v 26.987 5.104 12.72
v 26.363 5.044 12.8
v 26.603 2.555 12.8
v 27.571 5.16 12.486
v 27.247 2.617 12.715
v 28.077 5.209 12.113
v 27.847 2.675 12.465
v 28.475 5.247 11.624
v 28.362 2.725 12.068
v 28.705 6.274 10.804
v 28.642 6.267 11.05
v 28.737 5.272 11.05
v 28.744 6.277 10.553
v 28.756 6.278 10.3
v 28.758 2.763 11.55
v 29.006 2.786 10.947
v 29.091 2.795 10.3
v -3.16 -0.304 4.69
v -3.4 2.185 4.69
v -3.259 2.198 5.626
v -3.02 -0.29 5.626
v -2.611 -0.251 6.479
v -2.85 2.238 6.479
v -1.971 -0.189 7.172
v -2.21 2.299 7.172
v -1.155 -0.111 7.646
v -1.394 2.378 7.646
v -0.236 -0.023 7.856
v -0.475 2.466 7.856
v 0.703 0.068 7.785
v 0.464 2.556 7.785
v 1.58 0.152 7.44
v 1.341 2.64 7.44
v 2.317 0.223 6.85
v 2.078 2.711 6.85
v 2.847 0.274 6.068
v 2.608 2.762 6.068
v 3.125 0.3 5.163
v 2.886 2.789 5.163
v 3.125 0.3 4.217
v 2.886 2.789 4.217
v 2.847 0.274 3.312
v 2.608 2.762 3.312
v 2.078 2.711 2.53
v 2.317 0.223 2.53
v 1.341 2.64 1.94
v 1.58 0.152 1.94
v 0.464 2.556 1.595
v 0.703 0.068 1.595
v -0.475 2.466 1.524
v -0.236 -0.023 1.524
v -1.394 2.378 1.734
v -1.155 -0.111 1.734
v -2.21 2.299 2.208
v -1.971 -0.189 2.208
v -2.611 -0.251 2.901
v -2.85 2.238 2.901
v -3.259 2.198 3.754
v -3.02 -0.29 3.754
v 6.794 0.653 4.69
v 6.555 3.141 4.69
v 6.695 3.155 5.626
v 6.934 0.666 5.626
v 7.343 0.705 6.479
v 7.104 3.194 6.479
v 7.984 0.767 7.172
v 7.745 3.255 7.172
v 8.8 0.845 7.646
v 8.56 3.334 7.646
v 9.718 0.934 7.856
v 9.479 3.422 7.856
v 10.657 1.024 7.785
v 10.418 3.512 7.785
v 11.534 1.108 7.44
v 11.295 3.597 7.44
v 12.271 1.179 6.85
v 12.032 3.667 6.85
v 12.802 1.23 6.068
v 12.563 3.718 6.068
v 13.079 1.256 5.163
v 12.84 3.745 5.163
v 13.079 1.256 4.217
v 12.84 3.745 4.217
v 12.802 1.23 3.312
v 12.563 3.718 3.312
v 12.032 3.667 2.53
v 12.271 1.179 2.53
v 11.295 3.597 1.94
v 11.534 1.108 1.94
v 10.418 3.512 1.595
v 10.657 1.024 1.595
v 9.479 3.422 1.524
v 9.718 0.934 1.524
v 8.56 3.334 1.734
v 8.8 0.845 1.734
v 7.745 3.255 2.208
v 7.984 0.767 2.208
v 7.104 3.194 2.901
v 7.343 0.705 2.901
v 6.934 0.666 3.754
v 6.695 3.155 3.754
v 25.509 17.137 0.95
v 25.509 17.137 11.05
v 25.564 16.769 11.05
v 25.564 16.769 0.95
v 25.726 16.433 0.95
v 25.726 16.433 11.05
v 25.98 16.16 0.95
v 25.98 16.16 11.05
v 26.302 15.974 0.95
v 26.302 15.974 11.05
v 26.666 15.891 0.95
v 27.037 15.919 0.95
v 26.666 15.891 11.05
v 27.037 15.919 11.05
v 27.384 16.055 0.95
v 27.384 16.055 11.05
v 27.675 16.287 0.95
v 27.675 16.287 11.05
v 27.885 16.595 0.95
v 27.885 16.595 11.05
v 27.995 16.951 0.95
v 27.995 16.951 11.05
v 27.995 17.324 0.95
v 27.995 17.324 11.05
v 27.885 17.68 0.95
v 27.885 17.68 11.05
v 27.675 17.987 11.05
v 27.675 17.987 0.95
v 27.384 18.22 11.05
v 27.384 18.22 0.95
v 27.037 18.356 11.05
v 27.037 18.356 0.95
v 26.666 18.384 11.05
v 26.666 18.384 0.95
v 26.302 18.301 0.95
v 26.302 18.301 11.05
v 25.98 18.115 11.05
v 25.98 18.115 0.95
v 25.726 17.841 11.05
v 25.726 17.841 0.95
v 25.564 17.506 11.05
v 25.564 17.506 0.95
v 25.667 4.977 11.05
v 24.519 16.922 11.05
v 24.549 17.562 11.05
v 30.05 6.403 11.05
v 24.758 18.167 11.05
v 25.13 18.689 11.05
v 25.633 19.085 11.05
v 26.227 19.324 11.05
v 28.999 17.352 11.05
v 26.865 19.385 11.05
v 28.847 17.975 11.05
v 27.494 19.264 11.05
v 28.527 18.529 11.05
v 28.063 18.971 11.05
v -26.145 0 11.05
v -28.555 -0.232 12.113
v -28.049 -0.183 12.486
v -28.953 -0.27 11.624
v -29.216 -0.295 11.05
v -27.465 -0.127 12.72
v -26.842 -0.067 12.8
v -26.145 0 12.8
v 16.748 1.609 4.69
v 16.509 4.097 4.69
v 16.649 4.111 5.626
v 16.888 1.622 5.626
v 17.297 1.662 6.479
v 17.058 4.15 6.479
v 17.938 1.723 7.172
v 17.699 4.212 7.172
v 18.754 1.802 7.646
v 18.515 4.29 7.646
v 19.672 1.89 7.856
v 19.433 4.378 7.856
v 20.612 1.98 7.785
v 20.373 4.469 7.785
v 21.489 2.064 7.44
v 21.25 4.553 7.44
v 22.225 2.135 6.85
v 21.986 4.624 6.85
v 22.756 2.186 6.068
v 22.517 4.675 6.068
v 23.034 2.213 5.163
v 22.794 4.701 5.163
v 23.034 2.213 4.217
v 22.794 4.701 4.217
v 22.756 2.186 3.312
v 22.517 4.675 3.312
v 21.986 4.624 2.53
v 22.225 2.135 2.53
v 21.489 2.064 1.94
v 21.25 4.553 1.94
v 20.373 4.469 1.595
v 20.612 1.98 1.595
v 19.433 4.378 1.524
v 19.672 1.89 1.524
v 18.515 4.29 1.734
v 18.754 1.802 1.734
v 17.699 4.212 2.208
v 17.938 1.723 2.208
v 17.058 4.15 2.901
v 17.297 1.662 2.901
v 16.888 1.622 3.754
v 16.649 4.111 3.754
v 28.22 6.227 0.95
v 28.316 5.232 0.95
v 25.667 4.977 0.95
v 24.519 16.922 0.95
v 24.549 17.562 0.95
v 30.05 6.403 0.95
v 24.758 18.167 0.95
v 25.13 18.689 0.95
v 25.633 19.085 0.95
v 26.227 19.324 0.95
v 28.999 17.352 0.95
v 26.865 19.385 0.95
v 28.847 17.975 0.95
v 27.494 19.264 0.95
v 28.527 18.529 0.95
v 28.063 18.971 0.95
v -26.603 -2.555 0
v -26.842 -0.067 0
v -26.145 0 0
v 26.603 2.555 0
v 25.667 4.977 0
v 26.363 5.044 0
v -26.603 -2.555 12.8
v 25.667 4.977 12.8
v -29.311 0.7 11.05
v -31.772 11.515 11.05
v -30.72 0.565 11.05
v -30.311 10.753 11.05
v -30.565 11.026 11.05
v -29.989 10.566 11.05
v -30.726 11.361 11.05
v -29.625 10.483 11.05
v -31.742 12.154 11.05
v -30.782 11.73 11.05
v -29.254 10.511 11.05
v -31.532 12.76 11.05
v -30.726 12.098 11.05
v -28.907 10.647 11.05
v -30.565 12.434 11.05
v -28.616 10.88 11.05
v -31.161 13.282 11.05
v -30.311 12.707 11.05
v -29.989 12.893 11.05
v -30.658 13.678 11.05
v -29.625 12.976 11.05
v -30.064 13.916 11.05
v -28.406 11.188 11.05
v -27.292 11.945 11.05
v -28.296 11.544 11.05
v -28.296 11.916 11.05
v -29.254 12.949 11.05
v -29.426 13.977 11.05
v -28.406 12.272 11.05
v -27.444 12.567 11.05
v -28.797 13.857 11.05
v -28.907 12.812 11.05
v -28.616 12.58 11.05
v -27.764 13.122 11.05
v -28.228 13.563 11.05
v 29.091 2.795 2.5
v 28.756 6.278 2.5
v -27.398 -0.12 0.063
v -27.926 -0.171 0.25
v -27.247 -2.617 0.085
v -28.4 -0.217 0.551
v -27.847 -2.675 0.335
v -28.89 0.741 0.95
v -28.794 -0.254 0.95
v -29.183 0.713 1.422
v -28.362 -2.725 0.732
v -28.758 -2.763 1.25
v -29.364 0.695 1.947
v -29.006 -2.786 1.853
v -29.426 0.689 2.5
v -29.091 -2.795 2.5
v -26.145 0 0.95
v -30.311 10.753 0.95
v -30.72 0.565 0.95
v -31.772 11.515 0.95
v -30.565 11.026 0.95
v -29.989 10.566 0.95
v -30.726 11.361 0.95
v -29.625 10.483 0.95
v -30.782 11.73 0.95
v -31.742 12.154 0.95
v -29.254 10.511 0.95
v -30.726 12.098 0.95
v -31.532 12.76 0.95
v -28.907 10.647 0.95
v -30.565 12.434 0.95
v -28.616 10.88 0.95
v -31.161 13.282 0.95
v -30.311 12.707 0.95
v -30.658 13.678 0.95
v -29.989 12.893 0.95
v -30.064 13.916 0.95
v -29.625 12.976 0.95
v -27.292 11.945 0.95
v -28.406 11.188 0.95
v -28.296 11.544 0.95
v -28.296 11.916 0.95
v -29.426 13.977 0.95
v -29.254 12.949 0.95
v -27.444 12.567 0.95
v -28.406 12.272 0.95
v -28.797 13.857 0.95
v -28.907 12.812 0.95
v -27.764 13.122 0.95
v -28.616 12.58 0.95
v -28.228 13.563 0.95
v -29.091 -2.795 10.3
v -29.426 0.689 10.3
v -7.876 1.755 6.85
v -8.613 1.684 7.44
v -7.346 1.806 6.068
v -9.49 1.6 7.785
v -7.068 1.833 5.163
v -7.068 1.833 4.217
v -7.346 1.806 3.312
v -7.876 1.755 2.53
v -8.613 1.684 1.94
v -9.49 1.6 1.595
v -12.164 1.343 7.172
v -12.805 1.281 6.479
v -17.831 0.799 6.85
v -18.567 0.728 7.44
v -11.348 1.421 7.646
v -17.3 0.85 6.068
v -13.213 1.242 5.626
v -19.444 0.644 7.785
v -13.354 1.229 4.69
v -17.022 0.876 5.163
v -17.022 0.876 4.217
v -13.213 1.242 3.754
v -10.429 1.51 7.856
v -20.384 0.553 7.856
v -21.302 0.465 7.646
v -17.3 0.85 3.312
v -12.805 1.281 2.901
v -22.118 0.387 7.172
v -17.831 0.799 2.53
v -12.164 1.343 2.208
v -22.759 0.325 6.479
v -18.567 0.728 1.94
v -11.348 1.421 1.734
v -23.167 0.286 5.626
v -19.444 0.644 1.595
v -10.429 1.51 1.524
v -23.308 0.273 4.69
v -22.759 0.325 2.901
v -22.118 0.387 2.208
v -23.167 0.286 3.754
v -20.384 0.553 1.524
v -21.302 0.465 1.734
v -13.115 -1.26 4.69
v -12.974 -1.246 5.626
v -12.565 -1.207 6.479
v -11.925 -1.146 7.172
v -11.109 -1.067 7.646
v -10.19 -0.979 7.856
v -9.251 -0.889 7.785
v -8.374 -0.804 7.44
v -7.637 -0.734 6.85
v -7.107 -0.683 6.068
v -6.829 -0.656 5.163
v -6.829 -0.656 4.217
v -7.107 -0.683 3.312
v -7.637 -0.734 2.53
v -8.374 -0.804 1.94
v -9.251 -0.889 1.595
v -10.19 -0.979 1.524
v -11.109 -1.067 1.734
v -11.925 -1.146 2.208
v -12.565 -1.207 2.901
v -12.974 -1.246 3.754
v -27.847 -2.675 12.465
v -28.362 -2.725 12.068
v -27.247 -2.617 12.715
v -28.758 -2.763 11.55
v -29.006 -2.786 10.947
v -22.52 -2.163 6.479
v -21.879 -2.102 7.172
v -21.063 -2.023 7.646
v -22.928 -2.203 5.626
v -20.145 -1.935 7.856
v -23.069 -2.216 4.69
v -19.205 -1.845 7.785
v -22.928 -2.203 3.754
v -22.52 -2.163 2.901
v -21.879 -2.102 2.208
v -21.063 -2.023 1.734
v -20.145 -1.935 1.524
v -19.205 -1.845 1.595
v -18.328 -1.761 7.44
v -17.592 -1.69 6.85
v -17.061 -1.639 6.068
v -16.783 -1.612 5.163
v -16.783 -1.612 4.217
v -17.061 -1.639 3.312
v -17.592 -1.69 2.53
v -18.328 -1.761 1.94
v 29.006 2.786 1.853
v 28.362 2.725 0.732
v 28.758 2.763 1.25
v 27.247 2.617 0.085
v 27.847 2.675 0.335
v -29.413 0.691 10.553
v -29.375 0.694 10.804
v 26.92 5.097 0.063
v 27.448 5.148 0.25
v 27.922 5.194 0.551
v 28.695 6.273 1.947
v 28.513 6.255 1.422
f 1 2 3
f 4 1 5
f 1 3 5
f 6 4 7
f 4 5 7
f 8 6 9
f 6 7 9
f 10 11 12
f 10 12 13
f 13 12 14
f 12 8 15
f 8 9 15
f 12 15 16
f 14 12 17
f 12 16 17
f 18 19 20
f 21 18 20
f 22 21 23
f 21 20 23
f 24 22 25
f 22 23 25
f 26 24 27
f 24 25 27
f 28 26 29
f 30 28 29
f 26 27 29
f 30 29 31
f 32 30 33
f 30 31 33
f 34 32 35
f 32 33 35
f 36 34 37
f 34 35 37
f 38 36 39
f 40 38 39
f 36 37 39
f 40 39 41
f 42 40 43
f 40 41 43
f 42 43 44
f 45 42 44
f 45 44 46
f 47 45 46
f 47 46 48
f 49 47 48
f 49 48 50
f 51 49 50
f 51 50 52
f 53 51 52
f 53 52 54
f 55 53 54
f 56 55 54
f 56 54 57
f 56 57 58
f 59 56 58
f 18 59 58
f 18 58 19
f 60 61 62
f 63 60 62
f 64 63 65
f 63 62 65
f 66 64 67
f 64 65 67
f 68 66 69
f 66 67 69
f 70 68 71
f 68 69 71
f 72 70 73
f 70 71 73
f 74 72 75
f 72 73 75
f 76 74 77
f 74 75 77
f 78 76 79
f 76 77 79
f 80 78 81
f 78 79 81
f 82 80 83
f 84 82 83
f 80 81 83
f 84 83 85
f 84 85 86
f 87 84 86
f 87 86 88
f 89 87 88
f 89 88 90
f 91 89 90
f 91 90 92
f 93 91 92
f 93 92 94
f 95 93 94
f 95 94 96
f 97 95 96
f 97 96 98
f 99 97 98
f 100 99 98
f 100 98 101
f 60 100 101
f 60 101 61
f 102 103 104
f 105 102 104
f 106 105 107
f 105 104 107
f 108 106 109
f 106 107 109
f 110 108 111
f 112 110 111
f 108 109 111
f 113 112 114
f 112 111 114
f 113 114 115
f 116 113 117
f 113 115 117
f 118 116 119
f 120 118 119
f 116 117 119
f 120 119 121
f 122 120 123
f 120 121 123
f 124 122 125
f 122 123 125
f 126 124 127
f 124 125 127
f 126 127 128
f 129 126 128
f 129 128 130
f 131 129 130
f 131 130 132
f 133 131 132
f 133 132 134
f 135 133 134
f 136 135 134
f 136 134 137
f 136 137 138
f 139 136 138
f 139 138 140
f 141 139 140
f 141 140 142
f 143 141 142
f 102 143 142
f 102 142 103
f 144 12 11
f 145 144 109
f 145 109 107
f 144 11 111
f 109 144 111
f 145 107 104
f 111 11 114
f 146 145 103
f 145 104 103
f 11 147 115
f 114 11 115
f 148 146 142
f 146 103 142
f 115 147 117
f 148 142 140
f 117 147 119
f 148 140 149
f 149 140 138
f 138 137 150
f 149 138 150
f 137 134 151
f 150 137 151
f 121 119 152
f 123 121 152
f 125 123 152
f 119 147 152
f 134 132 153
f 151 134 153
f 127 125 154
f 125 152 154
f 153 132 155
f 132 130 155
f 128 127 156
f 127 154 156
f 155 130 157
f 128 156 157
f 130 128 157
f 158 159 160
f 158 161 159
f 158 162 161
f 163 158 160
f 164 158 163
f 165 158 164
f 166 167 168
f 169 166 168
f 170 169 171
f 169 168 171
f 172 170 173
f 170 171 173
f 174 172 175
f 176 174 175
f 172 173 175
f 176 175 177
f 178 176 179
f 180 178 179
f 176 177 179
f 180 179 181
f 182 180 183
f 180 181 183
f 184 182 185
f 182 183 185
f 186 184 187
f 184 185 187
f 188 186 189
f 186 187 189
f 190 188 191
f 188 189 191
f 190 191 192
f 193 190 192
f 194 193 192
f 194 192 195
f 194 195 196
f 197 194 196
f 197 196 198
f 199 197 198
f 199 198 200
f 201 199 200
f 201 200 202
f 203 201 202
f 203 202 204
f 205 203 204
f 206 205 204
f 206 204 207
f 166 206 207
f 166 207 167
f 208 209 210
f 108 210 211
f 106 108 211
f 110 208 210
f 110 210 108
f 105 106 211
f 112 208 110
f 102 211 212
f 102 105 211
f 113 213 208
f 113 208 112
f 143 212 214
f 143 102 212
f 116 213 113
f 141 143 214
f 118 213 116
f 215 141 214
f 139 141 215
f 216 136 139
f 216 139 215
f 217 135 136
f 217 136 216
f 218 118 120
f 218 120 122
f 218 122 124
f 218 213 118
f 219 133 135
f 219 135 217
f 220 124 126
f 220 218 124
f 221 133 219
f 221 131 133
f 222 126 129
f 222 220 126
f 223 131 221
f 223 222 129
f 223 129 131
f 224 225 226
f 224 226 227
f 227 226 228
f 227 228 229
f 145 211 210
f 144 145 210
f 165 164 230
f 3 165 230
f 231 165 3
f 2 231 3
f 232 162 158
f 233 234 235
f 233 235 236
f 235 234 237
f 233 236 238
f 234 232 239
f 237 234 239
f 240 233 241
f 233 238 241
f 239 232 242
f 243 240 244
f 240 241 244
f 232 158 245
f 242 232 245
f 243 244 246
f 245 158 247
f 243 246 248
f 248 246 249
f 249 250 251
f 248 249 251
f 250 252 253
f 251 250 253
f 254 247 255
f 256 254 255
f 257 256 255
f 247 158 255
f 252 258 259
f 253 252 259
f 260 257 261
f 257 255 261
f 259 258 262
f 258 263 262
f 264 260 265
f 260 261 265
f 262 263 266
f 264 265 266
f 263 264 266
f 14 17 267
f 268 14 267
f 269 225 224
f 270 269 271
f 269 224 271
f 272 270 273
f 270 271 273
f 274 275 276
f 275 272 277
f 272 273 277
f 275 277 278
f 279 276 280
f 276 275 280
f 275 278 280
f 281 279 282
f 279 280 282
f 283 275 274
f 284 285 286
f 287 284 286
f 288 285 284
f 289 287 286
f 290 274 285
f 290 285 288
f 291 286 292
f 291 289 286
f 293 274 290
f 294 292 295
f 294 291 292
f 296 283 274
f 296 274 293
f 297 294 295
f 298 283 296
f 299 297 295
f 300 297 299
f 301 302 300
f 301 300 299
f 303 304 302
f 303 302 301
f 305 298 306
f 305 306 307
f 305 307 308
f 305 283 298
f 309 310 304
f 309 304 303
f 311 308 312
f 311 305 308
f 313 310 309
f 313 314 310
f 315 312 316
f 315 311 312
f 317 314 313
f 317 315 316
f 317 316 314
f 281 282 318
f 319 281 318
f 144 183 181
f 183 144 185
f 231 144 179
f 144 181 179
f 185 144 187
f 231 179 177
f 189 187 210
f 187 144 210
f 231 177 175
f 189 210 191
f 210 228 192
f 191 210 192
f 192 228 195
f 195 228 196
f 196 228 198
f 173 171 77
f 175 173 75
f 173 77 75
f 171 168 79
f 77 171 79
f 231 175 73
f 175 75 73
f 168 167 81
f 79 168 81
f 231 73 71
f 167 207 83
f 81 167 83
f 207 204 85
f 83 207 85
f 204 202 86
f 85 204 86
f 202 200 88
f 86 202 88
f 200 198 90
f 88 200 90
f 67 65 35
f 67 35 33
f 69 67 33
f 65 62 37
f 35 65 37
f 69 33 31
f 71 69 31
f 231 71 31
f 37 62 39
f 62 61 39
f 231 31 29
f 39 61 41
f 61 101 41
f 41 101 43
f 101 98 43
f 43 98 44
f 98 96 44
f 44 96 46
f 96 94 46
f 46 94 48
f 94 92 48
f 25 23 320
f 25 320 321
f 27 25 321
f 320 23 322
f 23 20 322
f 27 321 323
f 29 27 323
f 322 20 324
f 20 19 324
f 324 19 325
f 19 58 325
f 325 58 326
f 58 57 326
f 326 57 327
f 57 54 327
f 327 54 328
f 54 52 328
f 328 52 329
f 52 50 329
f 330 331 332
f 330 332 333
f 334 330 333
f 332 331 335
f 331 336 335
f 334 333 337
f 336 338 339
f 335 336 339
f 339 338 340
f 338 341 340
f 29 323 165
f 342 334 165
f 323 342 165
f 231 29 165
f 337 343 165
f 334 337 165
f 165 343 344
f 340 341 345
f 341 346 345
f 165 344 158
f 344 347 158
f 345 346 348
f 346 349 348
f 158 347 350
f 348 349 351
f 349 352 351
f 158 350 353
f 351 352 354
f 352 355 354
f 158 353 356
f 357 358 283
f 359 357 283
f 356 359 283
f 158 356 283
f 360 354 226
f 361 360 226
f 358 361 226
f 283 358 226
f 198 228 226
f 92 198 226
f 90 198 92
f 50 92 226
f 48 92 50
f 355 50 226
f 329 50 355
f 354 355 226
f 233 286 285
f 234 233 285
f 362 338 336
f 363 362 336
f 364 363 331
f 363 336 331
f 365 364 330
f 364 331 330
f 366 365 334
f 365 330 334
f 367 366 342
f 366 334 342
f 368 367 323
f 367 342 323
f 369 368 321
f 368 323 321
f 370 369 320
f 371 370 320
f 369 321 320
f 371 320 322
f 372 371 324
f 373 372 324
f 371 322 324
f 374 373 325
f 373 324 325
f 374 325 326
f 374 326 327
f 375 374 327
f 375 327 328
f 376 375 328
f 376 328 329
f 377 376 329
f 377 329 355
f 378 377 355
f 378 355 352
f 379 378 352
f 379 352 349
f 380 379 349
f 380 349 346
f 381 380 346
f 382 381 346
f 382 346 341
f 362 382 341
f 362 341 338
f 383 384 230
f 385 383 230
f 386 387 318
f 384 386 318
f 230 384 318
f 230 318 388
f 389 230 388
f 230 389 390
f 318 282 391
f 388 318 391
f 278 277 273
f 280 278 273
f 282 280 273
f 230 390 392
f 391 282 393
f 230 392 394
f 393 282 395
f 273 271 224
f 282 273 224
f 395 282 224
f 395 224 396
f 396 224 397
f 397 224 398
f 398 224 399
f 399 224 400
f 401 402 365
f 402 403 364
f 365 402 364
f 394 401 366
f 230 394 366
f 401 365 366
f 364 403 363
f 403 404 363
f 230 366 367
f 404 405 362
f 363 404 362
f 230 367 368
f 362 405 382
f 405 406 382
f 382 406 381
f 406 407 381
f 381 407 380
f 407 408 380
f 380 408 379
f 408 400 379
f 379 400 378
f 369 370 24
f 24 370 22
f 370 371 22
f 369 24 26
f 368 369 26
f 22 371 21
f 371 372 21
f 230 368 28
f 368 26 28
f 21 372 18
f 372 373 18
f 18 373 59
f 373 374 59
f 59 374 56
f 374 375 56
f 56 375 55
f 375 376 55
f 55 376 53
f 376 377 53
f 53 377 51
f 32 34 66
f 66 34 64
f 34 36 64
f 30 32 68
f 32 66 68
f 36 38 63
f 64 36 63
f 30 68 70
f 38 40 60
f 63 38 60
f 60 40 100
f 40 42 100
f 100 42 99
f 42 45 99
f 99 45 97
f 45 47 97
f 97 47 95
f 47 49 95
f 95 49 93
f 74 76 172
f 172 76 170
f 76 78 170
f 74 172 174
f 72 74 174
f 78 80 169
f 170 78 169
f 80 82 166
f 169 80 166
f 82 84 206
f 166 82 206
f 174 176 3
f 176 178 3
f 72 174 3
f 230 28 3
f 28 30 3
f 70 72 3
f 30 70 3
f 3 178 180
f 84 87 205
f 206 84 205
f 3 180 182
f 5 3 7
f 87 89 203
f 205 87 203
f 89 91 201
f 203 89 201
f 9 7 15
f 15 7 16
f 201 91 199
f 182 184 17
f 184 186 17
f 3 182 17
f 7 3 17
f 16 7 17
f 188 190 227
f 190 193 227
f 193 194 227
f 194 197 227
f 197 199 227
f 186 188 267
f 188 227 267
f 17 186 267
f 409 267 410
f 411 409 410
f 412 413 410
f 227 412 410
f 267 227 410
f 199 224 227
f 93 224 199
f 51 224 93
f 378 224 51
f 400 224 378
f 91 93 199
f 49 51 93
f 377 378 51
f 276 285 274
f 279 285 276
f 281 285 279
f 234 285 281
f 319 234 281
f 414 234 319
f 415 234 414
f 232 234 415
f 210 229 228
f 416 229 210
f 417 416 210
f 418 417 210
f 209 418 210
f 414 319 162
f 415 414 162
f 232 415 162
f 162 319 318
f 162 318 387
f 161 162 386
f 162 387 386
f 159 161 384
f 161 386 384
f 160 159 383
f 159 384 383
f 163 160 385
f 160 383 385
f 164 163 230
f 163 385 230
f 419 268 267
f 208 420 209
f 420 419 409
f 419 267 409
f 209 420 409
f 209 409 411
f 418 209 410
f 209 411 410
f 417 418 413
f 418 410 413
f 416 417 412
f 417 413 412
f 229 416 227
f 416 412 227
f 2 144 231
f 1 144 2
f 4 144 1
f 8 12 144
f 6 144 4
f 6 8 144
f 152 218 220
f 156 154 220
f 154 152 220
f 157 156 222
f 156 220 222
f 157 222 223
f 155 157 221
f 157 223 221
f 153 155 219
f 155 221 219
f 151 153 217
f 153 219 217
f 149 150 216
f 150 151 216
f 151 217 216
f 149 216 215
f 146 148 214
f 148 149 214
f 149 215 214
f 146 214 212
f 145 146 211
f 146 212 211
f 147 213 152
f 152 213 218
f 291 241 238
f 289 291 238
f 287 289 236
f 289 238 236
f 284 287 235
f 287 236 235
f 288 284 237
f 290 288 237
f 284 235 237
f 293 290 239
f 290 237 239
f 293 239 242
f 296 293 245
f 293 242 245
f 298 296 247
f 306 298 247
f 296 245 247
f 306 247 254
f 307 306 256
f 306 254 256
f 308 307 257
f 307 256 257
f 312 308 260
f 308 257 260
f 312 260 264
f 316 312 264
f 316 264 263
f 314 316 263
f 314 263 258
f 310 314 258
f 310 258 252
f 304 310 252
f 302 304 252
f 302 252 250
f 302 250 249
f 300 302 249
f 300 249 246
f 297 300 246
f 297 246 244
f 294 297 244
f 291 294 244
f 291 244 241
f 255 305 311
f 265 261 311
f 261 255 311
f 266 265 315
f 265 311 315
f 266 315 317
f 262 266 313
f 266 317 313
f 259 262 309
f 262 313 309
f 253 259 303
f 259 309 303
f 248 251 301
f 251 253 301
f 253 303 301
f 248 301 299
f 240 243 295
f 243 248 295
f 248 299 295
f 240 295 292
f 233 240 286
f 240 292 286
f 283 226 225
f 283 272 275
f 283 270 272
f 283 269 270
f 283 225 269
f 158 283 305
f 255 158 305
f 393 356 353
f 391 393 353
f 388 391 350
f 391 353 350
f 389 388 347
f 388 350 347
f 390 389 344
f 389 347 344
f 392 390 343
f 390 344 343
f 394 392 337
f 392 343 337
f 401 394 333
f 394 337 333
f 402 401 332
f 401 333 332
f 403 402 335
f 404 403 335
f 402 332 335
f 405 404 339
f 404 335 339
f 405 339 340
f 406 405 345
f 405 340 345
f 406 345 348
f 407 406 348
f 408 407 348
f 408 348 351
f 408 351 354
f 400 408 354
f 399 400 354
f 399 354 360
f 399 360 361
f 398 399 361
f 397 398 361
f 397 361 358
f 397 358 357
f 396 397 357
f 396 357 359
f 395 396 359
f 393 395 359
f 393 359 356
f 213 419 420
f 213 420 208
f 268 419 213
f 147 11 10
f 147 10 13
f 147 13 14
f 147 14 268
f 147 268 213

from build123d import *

# Parameters (mm, degrees)
F1_DEPTH = 12.8
F3_DEPTH = 3.5
F4_W     = 18.9070843756
F4_H     = 1.75
F4_W_2   = 22.2780885547
F4_H_2   = 0.95
F5_DEPTH = 62.4295319173
F7_D     = 2.5
F9_D     = 6.35


with BuildPart() as f1:
    # F0 (on Top) → F1 (new body)
    with BuildSketch(Plane.XY):
        with BuildLine():
            ThreePointArc((-27.292256768, 11.945013416), (-29.7470947197, 13.9695554954), (-31.771636799, 11.5147175437))
            Line((-31.771636799, 11.5147175437), (-30.385127877, -2.918840334))
            Line((-30.385127877, -2.918840334), (30.385127877, 2.918840334))
            Line((30.385127877, 2.918840334), (28.9986189551, 17.3523982117))
            ThreePointArc((28.9986189551, 17.3523982117), (26.5437810034, 19.3769402911), (24.5192389241, 16.9221023394))
            Line((24.5192389241, 16.9221023394), (25.6666945836, 4.9770889233))
            Line((25.6666945836, 4.9770889233), (-26.1448011084, 0))
            Line((-26.1448011084, 0), (-27.292256768, 11.945013416))
        make_face()
    extrude(amount=F1_DEPTH)

    # F2 (on face) → F3 (cut)
    with BuildSketch(Plane(origin=(0, 0, 0), x_dir=(0.9954177847, 0.095621305, 0), z_dir=(0.095621305, -0.9954177847, 0))):
        with BuildLine():
            ThreePointArc((-29.225, 10.3), (-28.492766953, 12.067766953), (-26.725, 12.8))
            Line((-26.725, 12.8), (-30.525, 12.8))
            Line((-30.525, 12.8), (-30.525, 0))
            Line((-30.525, 0), (-26.725, 0))
            ThreePointArc((-26.725, 0), (-28.492766953, 0.732233047), (-29.225, 2.5))
            Line((-29.225, 2.5), (-29.225, 10.3))
        make_face()
        with BuildLine():
            Line((30.525, 12.8), (26.725, 12.8))
            ThreePointArc((26.725, 12.8), (28.492766953, 12.067766953), (29.225, 10.3))
            Line((29.225, 10.3), (29.225, 2.5))
            ThreePointArc((29.225, 2.5), (28.492766953, 0.732233047), (26.725, 0))
            Line((26.725, 0), (30.525, 0))
            Line((30.525, 0), (30.525, 12.8))
        make_face()
    extrude(amount=-F3_DEPTH, mode=Mode.SUBTRACT)

    # F4 (on face) → F5 (cut, through all)
    with BuildSketch(Plane(origin=(30.385127877, 2.918840334, 0), x_dir=(-0.095621305, 0.9954177847, 0), z_dir=(0.9954177847, 0.095621305, 0))):
        with Locations((11.9535421878, 11.925)):
            Rectangle(F4_W, F4_H)
        with Locations((13.6390442774, 0.475)):
            Rectangle(F4_W_2, F4_H_2)
    extrude(amount=-F5_DEPTH, mode=Mode.SUBTRACT)

    # F7 (through all)
    with Locations(Plane(origin=(0, 0, 0.95), x_dir=(1, 0, 0), z_dir=(0, 0, -1))):
        with Locations((26.7589289396, -17.1372502756), (-29.5319467835, -11.7298654799)):
            Hole(F7_D / 2)

    # F9 (through all)
    with Locations(Plane(origin=(0, 0, 0), x_dir=(0.9954177847, 0.095621305, 0), z_dir=(0.095621305, -0.9954177847, 0))):
        with Locations((-20, 4.69), (-10, 4.69), (0, 4.69), (10, 4.69), (20, 4.69)):
            Hole(F9_D / 2)


solid = f1.part
